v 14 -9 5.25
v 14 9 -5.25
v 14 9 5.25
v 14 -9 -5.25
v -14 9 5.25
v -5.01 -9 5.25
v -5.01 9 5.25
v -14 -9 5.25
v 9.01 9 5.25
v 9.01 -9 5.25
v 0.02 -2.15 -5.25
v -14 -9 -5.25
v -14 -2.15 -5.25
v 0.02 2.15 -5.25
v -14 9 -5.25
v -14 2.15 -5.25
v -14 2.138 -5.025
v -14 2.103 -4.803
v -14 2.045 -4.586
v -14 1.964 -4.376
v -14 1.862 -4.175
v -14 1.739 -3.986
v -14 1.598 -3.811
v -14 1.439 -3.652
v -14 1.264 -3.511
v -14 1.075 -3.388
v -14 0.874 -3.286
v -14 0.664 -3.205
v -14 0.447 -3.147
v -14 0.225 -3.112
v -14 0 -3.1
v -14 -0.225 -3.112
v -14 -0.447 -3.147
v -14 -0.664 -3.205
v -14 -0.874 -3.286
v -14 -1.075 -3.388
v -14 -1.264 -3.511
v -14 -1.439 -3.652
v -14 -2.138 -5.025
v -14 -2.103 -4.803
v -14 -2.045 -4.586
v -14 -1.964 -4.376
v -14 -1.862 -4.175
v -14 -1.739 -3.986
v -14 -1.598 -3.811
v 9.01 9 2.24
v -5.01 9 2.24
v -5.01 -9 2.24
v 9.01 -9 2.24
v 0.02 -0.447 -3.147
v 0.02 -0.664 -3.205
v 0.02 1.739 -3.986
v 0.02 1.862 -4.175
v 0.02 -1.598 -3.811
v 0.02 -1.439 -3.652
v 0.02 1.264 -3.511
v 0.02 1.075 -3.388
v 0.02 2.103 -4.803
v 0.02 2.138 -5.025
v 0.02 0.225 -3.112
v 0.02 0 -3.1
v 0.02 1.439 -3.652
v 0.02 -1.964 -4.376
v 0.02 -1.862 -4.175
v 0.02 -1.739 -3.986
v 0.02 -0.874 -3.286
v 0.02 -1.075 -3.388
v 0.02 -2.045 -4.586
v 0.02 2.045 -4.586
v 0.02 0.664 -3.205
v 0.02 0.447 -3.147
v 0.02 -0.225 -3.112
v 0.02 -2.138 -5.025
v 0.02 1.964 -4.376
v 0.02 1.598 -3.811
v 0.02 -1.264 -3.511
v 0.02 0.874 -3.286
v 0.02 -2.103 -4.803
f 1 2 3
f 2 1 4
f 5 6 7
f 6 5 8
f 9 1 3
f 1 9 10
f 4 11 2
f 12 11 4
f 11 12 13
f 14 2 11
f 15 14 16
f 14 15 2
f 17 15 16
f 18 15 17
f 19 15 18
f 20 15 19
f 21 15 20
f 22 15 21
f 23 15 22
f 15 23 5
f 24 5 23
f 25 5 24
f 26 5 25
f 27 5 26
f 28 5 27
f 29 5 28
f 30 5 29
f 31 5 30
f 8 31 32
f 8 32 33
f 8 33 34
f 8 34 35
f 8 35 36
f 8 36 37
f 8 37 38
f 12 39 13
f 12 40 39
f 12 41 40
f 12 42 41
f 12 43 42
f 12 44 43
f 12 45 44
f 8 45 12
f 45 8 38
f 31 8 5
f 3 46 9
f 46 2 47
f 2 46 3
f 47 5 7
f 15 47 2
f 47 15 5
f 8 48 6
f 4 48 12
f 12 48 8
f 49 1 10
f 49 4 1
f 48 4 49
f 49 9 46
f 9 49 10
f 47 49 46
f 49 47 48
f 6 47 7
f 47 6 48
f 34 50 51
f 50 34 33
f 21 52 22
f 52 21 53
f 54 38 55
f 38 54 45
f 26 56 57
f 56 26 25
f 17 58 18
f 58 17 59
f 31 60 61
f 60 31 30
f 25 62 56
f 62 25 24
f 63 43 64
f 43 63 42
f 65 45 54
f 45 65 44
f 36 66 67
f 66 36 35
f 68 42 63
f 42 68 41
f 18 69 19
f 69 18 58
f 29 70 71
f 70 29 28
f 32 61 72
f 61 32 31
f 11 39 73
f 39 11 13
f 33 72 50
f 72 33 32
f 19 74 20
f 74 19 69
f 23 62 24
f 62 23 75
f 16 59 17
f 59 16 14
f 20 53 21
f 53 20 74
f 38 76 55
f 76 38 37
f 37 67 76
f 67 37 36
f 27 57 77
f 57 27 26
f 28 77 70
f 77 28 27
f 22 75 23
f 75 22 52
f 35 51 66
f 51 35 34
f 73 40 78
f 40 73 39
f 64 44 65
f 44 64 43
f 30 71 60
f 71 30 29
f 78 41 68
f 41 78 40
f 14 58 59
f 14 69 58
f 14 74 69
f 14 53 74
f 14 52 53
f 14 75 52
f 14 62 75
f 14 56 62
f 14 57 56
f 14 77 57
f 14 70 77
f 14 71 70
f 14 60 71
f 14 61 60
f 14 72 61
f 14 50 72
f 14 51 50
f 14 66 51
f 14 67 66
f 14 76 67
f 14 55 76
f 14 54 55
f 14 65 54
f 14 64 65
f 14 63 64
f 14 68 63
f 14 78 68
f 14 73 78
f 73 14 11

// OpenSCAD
// Snap panel clip with a U-shaped panel slot.
$fn = 60;
eps = 0.02;
panel_t = 2.5;
clip_w = 18;
clip_l = 28;
clip_h = panel_t + 8;
slot = panel_t + 0.5;
difference() {
    cube([clip_l,clip_w,clip_h],center=true);
    translate([2,0,clip_h/2-slot/2]) cube([clip_l/2+eps,clip_w+2*eps,slot+eps],center=true);
    translate([-clip_l/2-eps,0,-clip_h/2]) rotate([0,90,0]) cylinder(d=4.3,h=clip_l/2+2*eps);
}
